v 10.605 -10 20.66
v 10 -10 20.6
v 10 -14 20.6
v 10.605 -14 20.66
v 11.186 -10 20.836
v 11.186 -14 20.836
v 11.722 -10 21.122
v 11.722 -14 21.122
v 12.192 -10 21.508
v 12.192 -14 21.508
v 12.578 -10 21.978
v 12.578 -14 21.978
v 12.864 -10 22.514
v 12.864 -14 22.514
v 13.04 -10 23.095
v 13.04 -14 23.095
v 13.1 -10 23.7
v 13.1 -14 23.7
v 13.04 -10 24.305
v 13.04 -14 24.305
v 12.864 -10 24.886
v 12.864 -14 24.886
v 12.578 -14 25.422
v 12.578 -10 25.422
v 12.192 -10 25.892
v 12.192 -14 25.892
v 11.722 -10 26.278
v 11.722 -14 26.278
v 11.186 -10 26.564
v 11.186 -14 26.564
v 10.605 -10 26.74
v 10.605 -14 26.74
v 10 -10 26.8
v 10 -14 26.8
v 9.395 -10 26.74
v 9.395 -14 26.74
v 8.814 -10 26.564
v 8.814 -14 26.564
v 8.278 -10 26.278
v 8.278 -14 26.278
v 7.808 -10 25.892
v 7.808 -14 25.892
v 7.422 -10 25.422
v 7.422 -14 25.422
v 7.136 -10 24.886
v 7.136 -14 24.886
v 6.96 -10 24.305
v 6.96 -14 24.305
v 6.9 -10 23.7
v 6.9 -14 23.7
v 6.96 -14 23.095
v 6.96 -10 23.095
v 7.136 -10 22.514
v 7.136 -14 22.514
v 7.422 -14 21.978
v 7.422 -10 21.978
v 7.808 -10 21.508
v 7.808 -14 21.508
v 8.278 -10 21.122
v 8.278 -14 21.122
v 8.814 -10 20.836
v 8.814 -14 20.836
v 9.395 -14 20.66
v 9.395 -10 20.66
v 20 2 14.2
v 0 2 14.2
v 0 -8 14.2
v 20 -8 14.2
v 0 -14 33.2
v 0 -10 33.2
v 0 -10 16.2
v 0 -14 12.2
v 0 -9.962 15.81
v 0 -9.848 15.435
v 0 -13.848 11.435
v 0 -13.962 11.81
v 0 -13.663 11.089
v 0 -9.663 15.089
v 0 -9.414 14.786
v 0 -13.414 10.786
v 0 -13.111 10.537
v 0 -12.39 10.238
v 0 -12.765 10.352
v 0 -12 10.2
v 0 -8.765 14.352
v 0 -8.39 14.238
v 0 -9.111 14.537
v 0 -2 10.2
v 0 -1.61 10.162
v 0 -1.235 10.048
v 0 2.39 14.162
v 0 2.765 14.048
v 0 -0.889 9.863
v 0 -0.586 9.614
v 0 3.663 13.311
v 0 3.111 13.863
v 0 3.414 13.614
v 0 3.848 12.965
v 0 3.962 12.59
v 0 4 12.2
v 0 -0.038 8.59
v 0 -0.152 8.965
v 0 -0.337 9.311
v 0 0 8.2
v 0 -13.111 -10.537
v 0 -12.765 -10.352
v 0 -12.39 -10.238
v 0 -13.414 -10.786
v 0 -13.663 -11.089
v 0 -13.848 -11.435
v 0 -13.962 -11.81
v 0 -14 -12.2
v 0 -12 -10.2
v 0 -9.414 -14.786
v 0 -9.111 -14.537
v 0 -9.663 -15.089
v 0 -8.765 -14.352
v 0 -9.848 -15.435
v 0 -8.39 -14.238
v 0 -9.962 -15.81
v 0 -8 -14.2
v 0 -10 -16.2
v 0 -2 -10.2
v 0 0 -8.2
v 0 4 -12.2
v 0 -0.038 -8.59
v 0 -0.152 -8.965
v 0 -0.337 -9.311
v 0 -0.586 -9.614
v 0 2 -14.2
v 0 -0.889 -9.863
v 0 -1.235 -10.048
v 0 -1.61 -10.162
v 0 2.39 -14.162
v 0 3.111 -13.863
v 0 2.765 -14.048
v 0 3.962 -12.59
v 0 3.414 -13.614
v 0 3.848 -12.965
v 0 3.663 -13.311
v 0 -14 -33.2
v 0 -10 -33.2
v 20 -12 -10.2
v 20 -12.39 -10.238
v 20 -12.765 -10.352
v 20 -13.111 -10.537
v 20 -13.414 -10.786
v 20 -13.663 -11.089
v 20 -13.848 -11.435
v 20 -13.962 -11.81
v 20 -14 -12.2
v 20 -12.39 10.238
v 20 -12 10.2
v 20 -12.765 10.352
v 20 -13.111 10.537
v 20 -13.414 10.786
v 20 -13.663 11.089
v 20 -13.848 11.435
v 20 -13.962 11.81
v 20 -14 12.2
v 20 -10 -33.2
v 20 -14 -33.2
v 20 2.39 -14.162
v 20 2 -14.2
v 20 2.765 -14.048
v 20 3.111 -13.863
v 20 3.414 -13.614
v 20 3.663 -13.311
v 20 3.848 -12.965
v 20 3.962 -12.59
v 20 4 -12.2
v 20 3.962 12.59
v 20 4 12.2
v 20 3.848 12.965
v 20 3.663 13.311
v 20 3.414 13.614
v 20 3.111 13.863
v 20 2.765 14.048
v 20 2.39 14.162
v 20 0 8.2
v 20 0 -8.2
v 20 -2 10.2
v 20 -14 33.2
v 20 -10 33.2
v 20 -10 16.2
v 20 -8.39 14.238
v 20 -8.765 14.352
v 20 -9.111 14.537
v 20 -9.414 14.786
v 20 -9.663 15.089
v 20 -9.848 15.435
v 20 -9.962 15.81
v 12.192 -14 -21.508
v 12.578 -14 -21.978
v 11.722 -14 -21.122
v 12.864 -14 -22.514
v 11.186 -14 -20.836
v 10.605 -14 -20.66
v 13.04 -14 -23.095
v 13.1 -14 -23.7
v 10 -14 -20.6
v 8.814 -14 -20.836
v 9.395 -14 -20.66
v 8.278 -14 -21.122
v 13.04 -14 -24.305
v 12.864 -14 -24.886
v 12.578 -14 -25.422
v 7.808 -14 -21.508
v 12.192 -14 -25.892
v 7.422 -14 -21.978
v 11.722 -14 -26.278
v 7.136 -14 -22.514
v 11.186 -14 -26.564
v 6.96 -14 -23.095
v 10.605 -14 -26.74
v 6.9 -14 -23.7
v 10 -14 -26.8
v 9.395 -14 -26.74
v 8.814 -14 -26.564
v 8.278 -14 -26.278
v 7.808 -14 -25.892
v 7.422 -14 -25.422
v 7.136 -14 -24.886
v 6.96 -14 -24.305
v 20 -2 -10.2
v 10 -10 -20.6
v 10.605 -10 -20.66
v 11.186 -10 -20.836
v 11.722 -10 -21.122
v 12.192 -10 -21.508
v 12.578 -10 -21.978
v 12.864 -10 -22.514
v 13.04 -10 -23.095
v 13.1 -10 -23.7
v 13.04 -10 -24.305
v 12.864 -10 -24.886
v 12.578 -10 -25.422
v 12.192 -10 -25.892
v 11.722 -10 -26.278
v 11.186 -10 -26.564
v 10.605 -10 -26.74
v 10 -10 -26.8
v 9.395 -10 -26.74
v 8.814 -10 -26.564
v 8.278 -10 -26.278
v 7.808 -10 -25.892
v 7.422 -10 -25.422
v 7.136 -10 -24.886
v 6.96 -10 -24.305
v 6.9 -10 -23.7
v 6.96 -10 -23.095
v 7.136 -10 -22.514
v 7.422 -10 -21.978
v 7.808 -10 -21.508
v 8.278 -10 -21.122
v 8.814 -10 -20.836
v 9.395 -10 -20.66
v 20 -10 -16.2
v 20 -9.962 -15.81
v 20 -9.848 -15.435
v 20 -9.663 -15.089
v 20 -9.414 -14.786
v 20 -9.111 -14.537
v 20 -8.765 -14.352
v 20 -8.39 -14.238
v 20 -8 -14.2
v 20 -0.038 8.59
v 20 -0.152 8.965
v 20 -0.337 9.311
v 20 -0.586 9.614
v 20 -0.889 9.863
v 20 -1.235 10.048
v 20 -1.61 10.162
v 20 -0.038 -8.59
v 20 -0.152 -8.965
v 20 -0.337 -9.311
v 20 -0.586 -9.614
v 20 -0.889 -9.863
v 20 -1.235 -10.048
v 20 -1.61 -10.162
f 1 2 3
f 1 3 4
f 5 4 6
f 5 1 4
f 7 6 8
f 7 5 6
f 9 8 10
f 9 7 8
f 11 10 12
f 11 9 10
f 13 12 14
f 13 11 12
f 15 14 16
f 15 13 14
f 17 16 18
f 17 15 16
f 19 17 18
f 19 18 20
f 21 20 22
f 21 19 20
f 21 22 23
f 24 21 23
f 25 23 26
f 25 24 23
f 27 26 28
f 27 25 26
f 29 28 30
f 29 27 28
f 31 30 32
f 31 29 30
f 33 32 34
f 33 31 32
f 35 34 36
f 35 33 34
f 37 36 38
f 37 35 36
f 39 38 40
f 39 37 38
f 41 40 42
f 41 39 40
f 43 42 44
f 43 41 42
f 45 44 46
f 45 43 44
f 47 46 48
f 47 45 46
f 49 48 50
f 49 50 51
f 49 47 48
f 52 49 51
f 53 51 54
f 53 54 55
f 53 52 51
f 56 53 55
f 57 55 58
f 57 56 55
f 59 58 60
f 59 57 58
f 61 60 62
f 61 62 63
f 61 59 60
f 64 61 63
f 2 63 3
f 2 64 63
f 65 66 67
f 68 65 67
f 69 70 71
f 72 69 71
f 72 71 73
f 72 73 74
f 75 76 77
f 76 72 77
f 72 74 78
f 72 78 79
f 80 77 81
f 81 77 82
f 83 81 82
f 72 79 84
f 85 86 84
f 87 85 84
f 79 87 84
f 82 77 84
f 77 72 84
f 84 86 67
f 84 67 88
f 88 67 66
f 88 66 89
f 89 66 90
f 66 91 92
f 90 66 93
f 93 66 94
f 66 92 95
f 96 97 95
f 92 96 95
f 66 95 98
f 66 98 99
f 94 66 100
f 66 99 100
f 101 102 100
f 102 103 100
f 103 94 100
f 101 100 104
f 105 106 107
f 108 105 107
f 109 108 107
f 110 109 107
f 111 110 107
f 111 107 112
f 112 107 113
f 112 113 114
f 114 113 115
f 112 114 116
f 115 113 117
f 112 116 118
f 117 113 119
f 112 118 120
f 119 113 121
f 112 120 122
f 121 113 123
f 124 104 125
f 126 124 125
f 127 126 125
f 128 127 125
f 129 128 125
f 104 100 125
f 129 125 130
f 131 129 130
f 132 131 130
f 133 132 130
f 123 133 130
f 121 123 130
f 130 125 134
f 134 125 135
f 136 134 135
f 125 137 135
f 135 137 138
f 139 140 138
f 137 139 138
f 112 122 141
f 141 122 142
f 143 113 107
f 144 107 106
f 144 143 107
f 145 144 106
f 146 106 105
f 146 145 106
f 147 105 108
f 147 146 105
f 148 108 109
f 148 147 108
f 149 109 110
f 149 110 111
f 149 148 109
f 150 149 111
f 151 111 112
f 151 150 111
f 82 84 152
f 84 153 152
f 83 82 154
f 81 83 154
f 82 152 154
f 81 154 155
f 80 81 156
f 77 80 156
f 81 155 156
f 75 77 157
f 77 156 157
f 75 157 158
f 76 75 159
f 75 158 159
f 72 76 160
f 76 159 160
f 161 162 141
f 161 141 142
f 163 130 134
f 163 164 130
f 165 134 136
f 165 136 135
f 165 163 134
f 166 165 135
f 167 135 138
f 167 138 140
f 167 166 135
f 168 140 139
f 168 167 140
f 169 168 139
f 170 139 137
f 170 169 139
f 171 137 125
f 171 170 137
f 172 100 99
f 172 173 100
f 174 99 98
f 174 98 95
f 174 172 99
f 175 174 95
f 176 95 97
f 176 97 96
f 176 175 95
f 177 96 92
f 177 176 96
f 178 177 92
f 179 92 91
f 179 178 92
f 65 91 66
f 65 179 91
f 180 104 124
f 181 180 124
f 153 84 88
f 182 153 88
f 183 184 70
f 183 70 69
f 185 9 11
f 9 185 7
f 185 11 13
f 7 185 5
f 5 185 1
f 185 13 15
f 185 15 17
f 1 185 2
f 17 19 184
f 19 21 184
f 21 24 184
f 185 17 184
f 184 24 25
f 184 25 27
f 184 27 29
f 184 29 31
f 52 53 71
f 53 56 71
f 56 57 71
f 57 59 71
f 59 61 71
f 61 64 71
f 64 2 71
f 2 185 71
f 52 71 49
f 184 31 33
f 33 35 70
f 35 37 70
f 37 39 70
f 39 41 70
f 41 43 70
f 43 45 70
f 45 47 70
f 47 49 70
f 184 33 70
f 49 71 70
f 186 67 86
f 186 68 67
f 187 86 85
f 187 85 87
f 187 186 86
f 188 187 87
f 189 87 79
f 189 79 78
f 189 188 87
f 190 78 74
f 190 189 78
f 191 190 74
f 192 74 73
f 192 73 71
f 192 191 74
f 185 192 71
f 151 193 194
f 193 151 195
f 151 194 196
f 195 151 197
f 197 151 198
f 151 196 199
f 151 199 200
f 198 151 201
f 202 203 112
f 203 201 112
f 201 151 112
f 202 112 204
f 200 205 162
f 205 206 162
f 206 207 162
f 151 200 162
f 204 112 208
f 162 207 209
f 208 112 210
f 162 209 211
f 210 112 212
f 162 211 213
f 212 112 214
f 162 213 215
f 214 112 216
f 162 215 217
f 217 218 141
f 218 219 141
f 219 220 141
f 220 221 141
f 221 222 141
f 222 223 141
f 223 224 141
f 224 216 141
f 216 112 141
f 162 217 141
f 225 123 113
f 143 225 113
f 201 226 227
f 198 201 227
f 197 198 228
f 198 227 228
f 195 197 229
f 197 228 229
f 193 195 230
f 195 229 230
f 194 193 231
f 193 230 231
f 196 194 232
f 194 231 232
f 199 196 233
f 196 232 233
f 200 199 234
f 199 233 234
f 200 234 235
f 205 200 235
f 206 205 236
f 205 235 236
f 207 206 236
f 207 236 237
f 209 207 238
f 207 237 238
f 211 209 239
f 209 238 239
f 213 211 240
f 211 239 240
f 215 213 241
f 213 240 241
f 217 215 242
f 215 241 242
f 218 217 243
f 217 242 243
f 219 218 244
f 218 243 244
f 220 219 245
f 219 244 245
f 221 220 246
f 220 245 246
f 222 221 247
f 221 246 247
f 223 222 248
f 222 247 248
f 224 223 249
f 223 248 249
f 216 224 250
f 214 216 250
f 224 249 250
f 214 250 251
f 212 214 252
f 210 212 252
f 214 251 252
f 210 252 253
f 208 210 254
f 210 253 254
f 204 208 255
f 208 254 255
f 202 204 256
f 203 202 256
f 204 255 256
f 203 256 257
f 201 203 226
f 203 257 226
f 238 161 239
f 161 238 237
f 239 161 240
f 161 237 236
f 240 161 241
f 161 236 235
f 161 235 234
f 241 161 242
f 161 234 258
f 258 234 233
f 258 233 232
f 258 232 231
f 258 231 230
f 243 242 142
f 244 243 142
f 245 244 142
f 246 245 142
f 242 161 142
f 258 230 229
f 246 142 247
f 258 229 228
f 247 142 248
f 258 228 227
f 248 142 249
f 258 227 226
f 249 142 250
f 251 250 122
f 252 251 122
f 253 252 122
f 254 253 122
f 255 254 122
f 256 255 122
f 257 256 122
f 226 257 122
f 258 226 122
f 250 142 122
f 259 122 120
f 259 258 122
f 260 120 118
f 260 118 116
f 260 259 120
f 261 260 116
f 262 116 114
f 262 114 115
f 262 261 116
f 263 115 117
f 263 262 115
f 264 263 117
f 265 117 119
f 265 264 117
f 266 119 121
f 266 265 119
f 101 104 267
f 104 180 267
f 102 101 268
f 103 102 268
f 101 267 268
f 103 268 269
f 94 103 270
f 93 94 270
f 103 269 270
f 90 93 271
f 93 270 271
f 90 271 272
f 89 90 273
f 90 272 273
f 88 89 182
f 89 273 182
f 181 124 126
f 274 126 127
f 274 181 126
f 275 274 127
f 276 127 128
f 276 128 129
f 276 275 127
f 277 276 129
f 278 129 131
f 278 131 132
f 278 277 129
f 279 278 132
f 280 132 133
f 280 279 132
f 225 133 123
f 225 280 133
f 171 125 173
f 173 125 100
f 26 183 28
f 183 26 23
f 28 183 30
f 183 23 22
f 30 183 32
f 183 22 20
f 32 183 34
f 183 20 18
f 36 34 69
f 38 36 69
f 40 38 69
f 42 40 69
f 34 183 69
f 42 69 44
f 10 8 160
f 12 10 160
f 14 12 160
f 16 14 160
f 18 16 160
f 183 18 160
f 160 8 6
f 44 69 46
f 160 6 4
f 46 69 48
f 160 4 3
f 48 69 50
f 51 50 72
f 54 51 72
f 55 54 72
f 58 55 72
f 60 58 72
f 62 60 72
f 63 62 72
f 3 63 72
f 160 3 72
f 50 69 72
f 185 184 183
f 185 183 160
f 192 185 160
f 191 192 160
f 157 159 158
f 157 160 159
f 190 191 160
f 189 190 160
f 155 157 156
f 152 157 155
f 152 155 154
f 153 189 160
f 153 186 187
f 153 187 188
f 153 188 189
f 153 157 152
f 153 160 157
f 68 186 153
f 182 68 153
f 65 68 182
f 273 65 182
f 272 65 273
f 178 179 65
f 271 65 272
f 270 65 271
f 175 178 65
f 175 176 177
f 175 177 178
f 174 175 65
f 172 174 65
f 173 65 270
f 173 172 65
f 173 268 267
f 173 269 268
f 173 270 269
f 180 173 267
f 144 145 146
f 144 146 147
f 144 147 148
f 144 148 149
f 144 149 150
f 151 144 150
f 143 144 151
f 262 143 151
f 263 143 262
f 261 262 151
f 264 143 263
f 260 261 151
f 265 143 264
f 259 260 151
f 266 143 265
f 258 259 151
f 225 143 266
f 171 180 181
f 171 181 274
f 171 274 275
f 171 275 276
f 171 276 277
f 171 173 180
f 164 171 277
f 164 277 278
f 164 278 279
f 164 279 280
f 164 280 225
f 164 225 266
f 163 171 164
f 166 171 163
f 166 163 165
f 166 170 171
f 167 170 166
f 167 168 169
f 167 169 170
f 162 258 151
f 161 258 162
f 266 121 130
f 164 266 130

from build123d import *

# Parameters (mm, degrees)
BOSS_EXTRUDE1_DEPTH = 20
SKETCH2_R           = 3.1
CUT_EXTRUDE1_DEPTH  = 4
FILLET1_R           = 2


with BuildPart() as part:
    # Sketch1 → Boss-Extrude1 (new body)
    with BuildSketch(Plane(origin=(0, 0, 0), x_dir=(0, 0, -1), z_dir=(1, 0, 0))):
        Polygon((-10.2, 0), (10.2, 0), (10.2, -14), (33.2, -14), (33.2, -10), (14.2, -10), (14.2, 4), (-14.2, 4), (-14.2, -10), (-33.2, -10), (-33.2, -14), (-10.2, -14), align=None)
    extrude(amount=BOSS_EXTRUDE1_DEPTH)

    # Sketch2 → Cut-Extrude1 (cut)
    with BuildSketch(Plane(origin=(0, -10, 0), x_dir=(1, 0, 0), z_dir=(0, 1, 0))):
        with Locations(Location((10, 23.7, 0), (0, 0, 270))):
            Circle(SKETCH2_R)
    cut_extrude1 = extrude(amount=-CUT_EXTRUDE1_DEPTH, mode=Mode.SUBTRACT)

    # Mirror1: Cut-Extrude1 across plane
    add(cut_extrude1.mirror(Plane.XY), mode=Mode.SUBTRACT)

    # Fillet1
    fillet1_edges = [part.edges().sort_by_distance(p)[0] for p in [
        (10, -14, 10.2),
        (10, -10, 14.2),
        (10, 4, 14.2),
        (10, 4, -14.2),
        (10, -10, -14.2),
        (10, -14, -10.2),
        (10, 0, -10.2),
        (10, 0, 10.2),
    ]]
    fillet(fillet1_edges, radius=FILLET1_R)


solid = part.part
